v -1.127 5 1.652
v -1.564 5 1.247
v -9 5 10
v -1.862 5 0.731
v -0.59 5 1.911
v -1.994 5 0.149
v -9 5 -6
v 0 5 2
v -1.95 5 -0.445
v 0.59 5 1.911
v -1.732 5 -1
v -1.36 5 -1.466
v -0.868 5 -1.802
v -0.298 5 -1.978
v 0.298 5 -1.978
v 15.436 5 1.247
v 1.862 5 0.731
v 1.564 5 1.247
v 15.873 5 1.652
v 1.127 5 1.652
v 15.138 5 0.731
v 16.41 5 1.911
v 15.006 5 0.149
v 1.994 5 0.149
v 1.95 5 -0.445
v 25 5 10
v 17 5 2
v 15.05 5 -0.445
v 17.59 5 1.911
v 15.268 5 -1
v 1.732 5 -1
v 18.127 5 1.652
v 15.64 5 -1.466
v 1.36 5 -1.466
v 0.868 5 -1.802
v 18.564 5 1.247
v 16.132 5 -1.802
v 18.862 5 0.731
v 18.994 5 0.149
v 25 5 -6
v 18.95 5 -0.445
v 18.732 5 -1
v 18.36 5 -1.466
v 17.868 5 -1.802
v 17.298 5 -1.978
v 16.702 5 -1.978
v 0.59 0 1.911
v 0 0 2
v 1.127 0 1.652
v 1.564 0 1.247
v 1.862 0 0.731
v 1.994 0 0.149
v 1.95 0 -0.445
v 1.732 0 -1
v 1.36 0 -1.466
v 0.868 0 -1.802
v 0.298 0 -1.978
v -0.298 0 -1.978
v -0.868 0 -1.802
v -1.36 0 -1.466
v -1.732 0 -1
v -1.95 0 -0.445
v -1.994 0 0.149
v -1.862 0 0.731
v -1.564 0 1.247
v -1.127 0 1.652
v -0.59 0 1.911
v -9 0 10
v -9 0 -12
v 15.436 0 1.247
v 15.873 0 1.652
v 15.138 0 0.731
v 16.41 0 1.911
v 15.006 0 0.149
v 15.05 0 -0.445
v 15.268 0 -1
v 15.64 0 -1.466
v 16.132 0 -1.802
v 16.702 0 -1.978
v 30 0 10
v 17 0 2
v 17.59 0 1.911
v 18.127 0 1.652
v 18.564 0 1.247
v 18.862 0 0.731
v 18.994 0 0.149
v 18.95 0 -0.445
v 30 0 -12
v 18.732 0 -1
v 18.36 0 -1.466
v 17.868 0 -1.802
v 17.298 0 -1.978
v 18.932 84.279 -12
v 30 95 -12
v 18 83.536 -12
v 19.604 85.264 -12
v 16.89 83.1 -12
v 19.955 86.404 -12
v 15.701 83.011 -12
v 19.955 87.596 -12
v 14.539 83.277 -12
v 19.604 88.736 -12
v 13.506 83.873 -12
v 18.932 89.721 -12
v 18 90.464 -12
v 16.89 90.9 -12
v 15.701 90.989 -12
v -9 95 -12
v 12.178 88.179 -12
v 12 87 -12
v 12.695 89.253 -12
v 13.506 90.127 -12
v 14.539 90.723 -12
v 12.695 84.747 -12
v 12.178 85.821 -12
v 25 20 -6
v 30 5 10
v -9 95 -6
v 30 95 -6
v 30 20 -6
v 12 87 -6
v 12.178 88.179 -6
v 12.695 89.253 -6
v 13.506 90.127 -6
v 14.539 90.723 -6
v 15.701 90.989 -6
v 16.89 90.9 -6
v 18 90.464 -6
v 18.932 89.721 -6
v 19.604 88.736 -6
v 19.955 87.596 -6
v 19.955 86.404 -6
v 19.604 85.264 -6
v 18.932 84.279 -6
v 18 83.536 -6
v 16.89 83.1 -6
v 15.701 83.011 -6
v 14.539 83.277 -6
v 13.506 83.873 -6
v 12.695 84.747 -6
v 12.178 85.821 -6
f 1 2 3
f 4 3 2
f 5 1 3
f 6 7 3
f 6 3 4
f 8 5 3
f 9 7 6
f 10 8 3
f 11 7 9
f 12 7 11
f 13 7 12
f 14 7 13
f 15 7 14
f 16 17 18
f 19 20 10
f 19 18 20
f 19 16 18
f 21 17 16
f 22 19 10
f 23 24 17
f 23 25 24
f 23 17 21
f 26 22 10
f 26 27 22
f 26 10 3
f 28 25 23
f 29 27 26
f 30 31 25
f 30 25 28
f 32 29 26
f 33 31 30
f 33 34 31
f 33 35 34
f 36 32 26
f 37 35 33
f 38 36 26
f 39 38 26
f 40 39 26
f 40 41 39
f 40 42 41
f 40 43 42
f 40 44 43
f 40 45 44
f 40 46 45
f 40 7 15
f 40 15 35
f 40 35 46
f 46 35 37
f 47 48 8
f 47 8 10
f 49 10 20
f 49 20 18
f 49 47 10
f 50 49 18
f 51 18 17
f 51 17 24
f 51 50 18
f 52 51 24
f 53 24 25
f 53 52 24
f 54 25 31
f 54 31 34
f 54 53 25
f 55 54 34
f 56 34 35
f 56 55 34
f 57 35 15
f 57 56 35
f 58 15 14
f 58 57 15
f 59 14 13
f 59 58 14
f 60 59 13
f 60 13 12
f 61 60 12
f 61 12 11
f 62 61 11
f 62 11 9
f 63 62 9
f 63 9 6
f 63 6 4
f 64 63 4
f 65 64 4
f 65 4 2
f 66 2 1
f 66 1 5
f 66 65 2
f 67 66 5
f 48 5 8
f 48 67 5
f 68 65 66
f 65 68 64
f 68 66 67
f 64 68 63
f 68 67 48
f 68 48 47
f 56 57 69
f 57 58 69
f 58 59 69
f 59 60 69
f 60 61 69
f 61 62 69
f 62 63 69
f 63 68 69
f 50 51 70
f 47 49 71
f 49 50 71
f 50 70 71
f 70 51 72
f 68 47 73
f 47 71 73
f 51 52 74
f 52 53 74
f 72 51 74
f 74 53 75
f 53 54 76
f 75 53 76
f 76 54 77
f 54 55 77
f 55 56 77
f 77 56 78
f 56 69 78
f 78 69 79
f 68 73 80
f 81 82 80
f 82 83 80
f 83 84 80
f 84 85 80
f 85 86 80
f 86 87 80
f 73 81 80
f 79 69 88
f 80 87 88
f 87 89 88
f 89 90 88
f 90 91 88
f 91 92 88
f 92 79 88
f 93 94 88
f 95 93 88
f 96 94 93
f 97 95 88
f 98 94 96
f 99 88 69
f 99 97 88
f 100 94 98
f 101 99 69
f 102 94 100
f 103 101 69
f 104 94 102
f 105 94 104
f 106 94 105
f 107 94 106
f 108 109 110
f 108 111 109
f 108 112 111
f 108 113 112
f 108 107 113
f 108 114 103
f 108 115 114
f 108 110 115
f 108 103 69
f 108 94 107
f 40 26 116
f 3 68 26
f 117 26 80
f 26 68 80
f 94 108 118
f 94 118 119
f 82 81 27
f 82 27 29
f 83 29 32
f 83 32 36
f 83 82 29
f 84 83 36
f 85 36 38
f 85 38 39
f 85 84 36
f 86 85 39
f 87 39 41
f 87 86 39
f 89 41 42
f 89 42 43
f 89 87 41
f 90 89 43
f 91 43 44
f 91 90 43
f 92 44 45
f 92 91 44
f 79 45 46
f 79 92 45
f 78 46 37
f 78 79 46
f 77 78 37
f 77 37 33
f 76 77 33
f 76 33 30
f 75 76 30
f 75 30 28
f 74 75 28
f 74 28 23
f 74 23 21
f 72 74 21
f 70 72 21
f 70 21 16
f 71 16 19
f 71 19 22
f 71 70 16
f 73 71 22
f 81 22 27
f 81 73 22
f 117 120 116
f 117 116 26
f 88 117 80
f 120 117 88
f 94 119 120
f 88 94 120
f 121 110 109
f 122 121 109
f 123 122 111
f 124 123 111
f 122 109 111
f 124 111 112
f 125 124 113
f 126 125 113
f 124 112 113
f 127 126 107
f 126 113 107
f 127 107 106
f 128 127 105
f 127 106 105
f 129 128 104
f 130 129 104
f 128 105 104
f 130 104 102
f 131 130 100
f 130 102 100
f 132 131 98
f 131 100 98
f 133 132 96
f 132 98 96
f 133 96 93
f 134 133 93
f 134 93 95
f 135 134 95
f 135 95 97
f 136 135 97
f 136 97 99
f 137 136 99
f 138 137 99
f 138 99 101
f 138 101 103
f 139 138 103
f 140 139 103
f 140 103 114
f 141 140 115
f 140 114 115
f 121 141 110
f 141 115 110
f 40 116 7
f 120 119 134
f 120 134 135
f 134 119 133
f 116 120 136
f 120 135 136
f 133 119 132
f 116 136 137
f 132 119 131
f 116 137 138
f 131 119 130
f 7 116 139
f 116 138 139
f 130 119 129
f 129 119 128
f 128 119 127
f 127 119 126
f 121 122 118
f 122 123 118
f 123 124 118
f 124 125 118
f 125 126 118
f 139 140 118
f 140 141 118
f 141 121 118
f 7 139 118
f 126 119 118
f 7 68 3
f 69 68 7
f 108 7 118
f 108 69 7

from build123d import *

# Parameters (mm, degrees)
SKETCH1_W           = 39
SKETCH1_H           = 22
SKETCH1_R           = 2
BOSS_EXTRUDE1_DEPTH = 5
SKETCH4_R           = 4
BOSS_EXTRUDE2_DEPTH = 6
BOSS_EXTRUDE3_DEPTH = 5


with BuildPart() as part:
    # Sketch1 → Boss-Extrude1 (new body)
    with BuildSketch(Plane(origin=(0, 0, 0), x_dir=(1, 0, 0), z_dir=(0, 1, 0))):
        with Locations((10.5, 1)):
            Rectangle(SKETCH1_W, SKETCH1_H)
        with Locations(Location((0, 0, 0), (0, 0, 270))):
            Circle(SKETCH1_R, mode=Mode.SUBTRACT)
        with Locations(Location((17, 0, 0), (0, 0, 270))):
            Circle(SKETCH1_R, mode=Mode.SUBTRACT)
    extrude(amount=BOSS_EXTRUDE1_DEPTH)

    # Sketch4 → Boss-Extrude2 (add)
    with BuildSketch(Plane(origin=(0, 0, -12), x_dir=(-1, 0, 0), z_dir=(0, 0, -1))):
        Polygon((-30, 5), (9, 5), (9, 15), (9, 95), (-30, 95), (-30, 15), align=None)
        with Locations((-16, 87)):
            Circle(SKETCH4_R, mode=Mode.SUBTRACT)
    extrude(amount=-BOSS_EXTRUDE2_DEPTH)

    # Sketch5 → Boss-Extrude3 (add)
    with BuildSketch(Plane(origin=(30, 0, 0), x_dir=(0, 0, -1), z_dir=(1, 0, 0))):
        Polygon((-10, 5), (6, 5), (6, 20), align=None)
    extrude(amount=-BOSS_EXTRUDE3_DEPTH)


solid = part.part
